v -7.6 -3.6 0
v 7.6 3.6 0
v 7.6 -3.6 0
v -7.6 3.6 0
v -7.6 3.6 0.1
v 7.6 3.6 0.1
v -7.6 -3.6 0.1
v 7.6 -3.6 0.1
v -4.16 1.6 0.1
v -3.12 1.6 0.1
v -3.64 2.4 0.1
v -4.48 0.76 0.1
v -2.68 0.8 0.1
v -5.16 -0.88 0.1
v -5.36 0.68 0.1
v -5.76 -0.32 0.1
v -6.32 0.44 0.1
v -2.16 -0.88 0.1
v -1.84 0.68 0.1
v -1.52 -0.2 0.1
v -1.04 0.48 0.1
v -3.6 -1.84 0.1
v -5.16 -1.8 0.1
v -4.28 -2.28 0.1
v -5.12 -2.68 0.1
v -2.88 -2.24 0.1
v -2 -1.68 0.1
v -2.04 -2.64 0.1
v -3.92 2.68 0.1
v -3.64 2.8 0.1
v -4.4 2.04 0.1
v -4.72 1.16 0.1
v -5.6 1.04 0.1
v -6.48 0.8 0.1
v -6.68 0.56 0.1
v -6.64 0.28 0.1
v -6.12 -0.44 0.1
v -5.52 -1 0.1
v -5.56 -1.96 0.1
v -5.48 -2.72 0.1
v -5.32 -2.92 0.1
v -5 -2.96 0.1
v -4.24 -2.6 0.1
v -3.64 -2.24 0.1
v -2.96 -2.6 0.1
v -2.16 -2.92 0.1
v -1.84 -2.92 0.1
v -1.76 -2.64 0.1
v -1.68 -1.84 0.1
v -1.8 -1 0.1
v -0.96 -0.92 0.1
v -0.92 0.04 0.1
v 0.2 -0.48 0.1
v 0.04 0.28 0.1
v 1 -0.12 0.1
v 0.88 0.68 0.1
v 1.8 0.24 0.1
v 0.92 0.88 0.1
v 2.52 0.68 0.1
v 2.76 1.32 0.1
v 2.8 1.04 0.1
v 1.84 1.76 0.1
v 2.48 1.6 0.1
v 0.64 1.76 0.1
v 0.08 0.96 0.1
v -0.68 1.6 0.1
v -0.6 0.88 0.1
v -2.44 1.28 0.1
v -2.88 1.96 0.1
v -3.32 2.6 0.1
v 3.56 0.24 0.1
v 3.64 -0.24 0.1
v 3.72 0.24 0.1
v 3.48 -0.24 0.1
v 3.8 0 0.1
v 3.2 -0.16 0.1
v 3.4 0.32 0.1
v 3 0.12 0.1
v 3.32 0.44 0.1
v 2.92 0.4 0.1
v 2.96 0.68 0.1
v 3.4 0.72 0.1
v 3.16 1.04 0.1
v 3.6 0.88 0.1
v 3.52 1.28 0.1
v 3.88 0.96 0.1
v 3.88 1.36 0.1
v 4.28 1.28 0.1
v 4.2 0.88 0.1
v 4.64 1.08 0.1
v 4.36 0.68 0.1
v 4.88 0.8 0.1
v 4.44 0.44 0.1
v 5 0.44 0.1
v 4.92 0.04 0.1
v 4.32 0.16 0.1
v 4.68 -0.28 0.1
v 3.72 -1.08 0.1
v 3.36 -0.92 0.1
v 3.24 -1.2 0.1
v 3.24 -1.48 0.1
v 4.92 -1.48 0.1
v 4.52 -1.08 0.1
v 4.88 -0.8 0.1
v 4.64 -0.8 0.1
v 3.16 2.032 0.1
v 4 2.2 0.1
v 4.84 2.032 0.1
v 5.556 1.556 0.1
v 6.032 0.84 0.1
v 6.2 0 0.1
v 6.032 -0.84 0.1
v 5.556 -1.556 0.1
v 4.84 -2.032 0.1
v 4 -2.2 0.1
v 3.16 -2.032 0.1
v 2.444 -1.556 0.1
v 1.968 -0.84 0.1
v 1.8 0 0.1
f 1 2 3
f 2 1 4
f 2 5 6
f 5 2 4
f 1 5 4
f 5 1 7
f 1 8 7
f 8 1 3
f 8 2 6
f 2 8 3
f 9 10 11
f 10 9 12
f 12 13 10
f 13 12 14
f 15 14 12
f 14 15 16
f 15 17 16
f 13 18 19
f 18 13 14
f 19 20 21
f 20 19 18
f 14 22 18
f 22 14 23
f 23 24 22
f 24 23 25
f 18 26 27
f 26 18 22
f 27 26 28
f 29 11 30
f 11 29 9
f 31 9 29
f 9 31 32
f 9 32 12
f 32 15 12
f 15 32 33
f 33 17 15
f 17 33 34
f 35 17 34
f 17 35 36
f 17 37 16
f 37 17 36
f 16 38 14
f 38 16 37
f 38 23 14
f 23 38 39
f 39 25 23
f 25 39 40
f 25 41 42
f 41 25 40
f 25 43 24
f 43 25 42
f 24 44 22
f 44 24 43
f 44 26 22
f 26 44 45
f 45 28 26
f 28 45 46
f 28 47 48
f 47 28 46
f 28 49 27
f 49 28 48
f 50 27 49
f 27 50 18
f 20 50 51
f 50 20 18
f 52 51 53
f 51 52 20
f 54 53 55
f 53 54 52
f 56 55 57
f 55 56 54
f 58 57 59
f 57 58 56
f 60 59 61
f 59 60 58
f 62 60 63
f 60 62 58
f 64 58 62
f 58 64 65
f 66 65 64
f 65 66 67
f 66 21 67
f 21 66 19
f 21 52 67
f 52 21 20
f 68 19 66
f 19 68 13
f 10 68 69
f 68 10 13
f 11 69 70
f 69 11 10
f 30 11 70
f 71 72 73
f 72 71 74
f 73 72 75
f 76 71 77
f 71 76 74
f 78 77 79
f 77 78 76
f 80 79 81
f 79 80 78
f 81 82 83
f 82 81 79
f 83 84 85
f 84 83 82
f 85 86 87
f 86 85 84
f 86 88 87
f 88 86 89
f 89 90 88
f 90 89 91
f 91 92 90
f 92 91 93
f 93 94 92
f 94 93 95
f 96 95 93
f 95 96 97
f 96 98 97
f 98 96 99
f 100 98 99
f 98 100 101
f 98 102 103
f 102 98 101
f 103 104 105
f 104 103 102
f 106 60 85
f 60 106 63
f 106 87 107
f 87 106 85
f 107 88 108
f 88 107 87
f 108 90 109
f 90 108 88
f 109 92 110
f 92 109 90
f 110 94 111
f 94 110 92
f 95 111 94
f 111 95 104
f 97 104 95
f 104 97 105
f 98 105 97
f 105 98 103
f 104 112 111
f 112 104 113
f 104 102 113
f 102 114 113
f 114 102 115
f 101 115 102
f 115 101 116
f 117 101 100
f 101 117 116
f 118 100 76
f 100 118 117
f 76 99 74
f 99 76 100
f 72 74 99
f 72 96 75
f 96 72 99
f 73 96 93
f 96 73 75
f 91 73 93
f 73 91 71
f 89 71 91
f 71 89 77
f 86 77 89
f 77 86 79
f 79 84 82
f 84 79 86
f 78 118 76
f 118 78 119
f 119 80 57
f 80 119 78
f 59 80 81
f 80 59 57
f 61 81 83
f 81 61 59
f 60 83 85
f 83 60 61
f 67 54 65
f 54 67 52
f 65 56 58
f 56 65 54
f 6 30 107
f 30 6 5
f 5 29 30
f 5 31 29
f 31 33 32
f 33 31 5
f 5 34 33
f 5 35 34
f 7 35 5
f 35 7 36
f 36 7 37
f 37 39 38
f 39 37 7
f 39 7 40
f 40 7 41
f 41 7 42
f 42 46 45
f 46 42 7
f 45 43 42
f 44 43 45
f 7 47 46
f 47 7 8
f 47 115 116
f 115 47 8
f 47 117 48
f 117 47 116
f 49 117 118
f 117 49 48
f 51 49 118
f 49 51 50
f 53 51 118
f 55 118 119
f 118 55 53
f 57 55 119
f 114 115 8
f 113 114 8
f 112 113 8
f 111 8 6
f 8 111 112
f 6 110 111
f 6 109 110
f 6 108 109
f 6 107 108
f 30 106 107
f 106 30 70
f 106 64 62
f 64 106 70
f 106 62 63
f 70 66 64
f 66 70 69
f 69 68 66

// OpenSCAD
// file: ../p/box5-12.scad
use <../lib.scad>
function ldraw_lib__box5_12() = [
// 0 Box with 5 Faces without Any Edges
// 0 Name: box5-12.dat
// 0 Author: Chris Dee [cwdee]
// 0 !LDRAW_ORG Primitive UPDATE 2009-02
// 0 !LICENSE Licensed under CC BY 4.0 : see CAreadme.txt
// 
// 0 BFC CERTIFY CCW
  [0,"BFC","CERTIFY"],
  [0,"BFC","CCW"],
// 
// 0 !HISTORY 2009-09-03 [PTadmin] Official Update 2009-02
// 
// 
// 4 16 1 1 1 1 1 -1 -1 1 -1 -1 1 1
  [4,16,1,1,1,1,1,-1,-1,1,-1,-1,1,1],
// 4 16 -1 0 1 1 0 1 1 1 1 -1 1 1
  [4,16,-1,0,1,1,0,1,1,1,1,-1,1,1],
// 4 16 -1 0 -1 -1 0 1 -1 1 1 -1 1 -1
  [4,16,-1,0,-1,-1,0,1,-1,1,1,-1,1,-1],
// 4 16 1 0 -1 -1 0 -1 -1 1 -1 1 1 -1
  [4,16,1,0,-1,-1,0,-1,-1,1,-1,1,1,-1],
// 4 16 1 0 1 1 0 -1 1 1 -1 1 1 1
  [4,16,1,0,1,1,0,-1,1,1,-1,1,1,1],
// 0
];
module ldraw_lib__box5_12(step=0, col=false, unit=2/5, alt=false, line=0.2, solid=!$preview)
    makepoly(ldraw_lib__box5_12(), step=step, col=col, unit=unit, alt=alt, line=line, solid=solid);
ldraw_lib__box5_12(line=0.2);
// main file
use <../lib.scad>
use <../p/box5-12.scad>
function ldraw_lib__6018377d() = [
// 0 Sticker  0.9 x  1.9 with Star and Medium Lavender "2" in White Circle on Lime Background
// 0 Name: 6018377d.dat
// 0 Author: Takeshi Takahashi [RainbowDolphin]
// 0 !LDRAW_ORG Part UPDATE 2025-07
// 0 !LICENSE Licensed under CC BY 4.0 : see CAreadme.txt
// 
// 0 BFC CERTIFY CCW
  [0,"BFC","CERTIFY"],
  [0,"BFC","CCW"],
// 
// 0 !KEYWORDS Pet salon, Price card, Set 41007
// 
// 0 !HISTORY 2025-07-27 [OrionP] Official Update 2025-07
// 
// 
// 1 16 0 -0.25 0 19 0 0 0 0.25 0 0 0 9 box5-12.dat
  [1,16,0,-0.25,0,19,0,0,0,0.25,0,0,0,9, ldraw_lib__box5_12()],
// 4 26 -7.8 -0.25 4 -9.1 -0.25 6 -10.4 -0.25 4 -11.2 -0.25 1.9
  [4,26,-7.8,-0.25,4,-9.1,-0.25,6,-10.4,-0.25,4,-11.2,-0.25,1.9],
// 4 26 -6.7 -0.25 2 -7.8 -0.25 4 -11.2 -0.25 1.9 -12.9 -0.25 -2.2
  [4,26,-6.7,-0.25,2,-7.8,-0.25,4,-11.2,-0.25,1.9,-12.9,-0.25,-2.2],
// 4 26 -12.9 -0.25 -2.2 -11.2 -0.25 1.9 -13.4 -0.25 1.7 -14.4 -0.25 -0.8
  [4,26,-12.9,-0.25,-2.2,-11.2,-0.25,1.9,-13.4,-0.25,1.7,-14.4,-0.25,-0.8],
// 3 26 -13.4 -0.25 1.7 -15.8 -0.25 1.1 -14.4 -0.25 -0.8
  [3,26,-13.4,-0.25,1.7,-15.8,-0.25,1.1,-14.4,-0.25,-0.8],
// 4 26 -6.7 -0.25 2 -12.9 -0.25 -2.2 -5.4 -0.25 -2.2 -4.6 -0.25 1.7
  [4,26,-6.7,-0.25,2,-12.9,-0.25,-2.2,-5.4,-0.25,-2.2,-4.6,-0.25,1.7],
// 4 26 -4.6 -0.25 1.7 -5.4 -0.25 -2.2 -3.8 -0.25 -0.5 -2.6 -0.25 1.2
  [4,26,-4.6,-0.25,1.7,-5.4,-0.25,-2.2,-3.8,-0.25,-0.5,-2.6,-0.25,1.2],
// 4 26 -9 -0.25 -4.6 -5.4 -0.25 -2.2 -12.9 -0.25 -2.2 -12.9 -0.25 -4.5
  [4,26,-9,-0.25,-4.6,-5.4,-0.25,-2.2,-12.9,-0.25,-2.2,-12.9,-0.25,-4.5],
// 4 26 -10.7 -0.25 -5.7 -9 -0.25 -4.6 -12.9 -0.25 -4.5 -12.8 -0.25 -6.7
  [4,26,-10.7,-0.25,-5.7,-9,-0.25,-4.6,-12.9,-0.25,-4.5,-12.8,-0.25,-6.7],
// 4 26 -5.4 -0.25 -2.2 -9 -0.25 -4.6 -7.2 -0.25 -5.6 -5 -0.25 -4.2
  [4,26,-5.4,-0.25,-2.2,-9,-0.25,-4.6,-7.2,-0.25,-5.6,-5,-0.25,-4.2],
// 3 26 -5 -0.25 -4.2 -7.2 -0.25 -5.6 -5.1 -0.25 -6.6
  [3,26,-5,-0.25,-4.2,-7.2,-0.25,-5.6,-5.1,-0.25,-6.6],
// 4 80 -9.1 -0.25 6 -9.1 -0.25 7 -9.8 -0.25 6.7 -10.4 -0.25 4
  [4,80,-9.1,-0.25,6,-9.1,-0.25,7,-9.8,-0.25,6.7,-10.4,-0.25,4],
// 4 80 -10.4 -0.25 4 -9.8 -0.25 6.7 -11 -0.25 5.1 -11.8 -0.25 2.9
  [4,80,-10.4,-0.25,4,-9.8,-0.25,6.7,-11,-0.25,5.1,-11.8,-0.25,2.9],
// 3 80 -10.4 -0.25 4 -11.8 -0.25 2.9 -11.2 -0.25 1.9
  [3,80,-10.4,-0.25,4,-11.8,-0.25,2.9,-11.2,-0.25,1.9],
// 4 80 -13.4 -0.25 1.7 -11.2 -0.25 1.9 -11.8 -0.25 2.9 -14 -0.25 2.6
  [4,80,-13.4,-0.25,1.7,-11.2,-0.25,1.9,-11.8,-0.25,2.9,-14,-0.25,2.6],
// 4 80 -15.8 -0.25 1.1 -13.4 -0.25 1.7 -14 -0.25 2.6 -16.2 -0.25 2
  [4,80,-15.8,-0.25,1.1,-13.4,-0.25,1.7,-14,-0.25,2.6,-16.2,-0.25,2],
// 4 80 -15.8 -0.25 1.1 -16.2 -0.25 2 -16.7 -0.25 1.4 -16.6 -0.25 0.7
  [4,80,-15.8,-0.25,1.1,-16.2,-0.25,2,-16.7,-0.25,1.4,-16.6,-0.25,0.7],
// 4 80 -14.4 -0.25 -0.8 -15.8 -0.25 1.1 -16.6 -0.25 0.7 -15.3 -0.25 -1.1
  [4,80,-14.4,-0.25,-0.8,-15.8,-0.25,1.1,-16.6,-0.25,0.7,-15.3,-0.25,-1.1],
// 4 80 -14.4 -0.25 -0.8 -15.3 -0.25 -1.1 -13.8 -0.25 -2.5 -12.9 -0.25 -2.2
  [4,80,-14.4,-0.25,-0.8,-15.3,-0.25,-1.1,-13.8,-0.25,-2.5,-12.9,-0.25,-2.2],
// 4 80 -12.9 -0.25 -4.5 -12.9 -0.25 -2.2 -13.8 -0.25 -2.5 -13.9 -0.25 -4.9
  [4,80,-12.9,-0.25,-4.5,-12.9,-0.25,-2.2,-13.8,-0.25,-2.5,-13.9,-0.25,-4.9],
// 4 80 -12.8 -0.25 -6.7 -12.9 -0.25 -4.5 -13.9 -0.25 -4.9 -13.7 -0.25 -6.8
  [4,80,-12.8,-0.25,-6.7,-12.9,-0.25,-4.5,-13.9,-0.25,-4.9,-13.7,-0.25,-6.8],
// 4 80 -12.8 -0.25 -6.7 -13.7 -0.25 -6.8 -13.3 -0.25 -7.3 -12.5 -0.25 -7.4
  [4,80,-12.8,-0.25,-6.7,-13.7,-0.25,-6.8,-13.3,-0.25,-7.3,-12.5,-0.25,-7.4],
// 4 80 -10.7 -0.25 -5.7 -12.8 -0.25 -6.7 -12.5 -0.25 -7.4 -10.6 -0.25 -6.5
  [4,80,-10.7,-0.25,-5.7,-12.8,-0.25,-6.7,-12.5,-0.25,-7.4,-10.6,-0.25,-6.5],
// 4 80 -10.7 -0.25 -5.7 -10.6 -0.25 -6.5 -9.1 -0.25 -5.6 -9 -0.25 -4.6
  [4,80,-10.7,-0.25,-5.7,-10.6,-0.25,-6.5,-9.1,-0.25,-5.6,-9,-0.25,-4.6],
// 4 80 -7.2 -0.25 -5.6 -9 -0.25 -4.6 -9.1 -0.25 -5.6 -7.4 -0.25 -6.5
  [4,80,-7.2,-0.25,-5.6,-9,-0.25,-4.6,-9.1,-0.25,-5.6,-7.4,-0.25,-6.5],
// 4 80 -5.1 -0.25 -6.6 -7.2 -0.25 -5.6 -7.4 -0.25 -6.5 -5.4 -0.25 -7.3
  [4,80,-5.1,-0.25,-6.6,-7.2,-0.25,-5.6,-7.4,-0.25,-6.5,-5.4,-0.25,-7.3],
// 4 80 -5.1 -0.25 -6.6 -5.4 -0.25 -7.3 -4.6 -0.25 -7.3 -4.4 -0.25 -6.6
  [4,80,-5.1,-0.25,-6.6,-5.4,-0.25,-7.3,-4.6,-0.25,-7.3,-4.4,-0.25,-6.6],
// 4 80 -5 -0.25 -4.2 -5.1 -0.25 -6.6 -4.4 -0.25 -6.6 -4.2 -0.25 -4.6
  [4,80,-5,-0.25,-4.2,-5.1,-0.25,-6.6,-4.4,-0.25,-6.6,-4.2,-0.25,-4.6],
// 4 80 -5 -0.25 -4.2 -4.2 -0.25 -4.6 -4.5 -0.25 -2.5 -5.4 -0.25 -2.2
  [4,80,-5,-0.25,-4.2,-4.2,-0.25,-4.6,-4.5,-0.25,-2.5,-5.4,-0.25,-2.2],
// 4 80 -3.8 -0.25 -0.5 -5.4 -0.25 -2.2 -4.5 -0.25 -2.5 -2.4 -0.25 -2.3
  [4,80,-3.8,-0.25,-0.5,-5.4,-0.25,-2.2,-4.5,-0.25,-2.5,-2.4,-0.25,-2.3],
// 4 80 -2.3 -0.25 0.1 -3.8 -0.25 -0.5 -2.4 -0.25 -2.3 0.5 -0.25 -1.2
  [4,80,-2.3,-0.25,0.1,-3.8,-0.25,-0.5,-2.4,-0.25,-2.3,0.5,-0.25,-1.2],
// 4 80 0.1 -0.25 0.7 -2.3 -0.25 0.1 0.5 -0.25 -1.2 2.5 -0.25 -0.3
  [4,80,0.1,-0.25,0.7,-2.3,-0.25,0.1,0.5,-0.25,-1.2,2.5,-0.25,-0.3],
// 4 80 2.2 -0.25 1.7 0.1 -0.25 0.7 2.5 -0.25 -0.3 4.5 -0.25 0.6
  [4,80,2.2,-0.25,1.7,0.1,-0.25,0.7,2.5,-0.25,-0.3,4.5,-0.25,0.6],
// 4 80 2.3 -0.25 2.2 2.2 -0.25 1.7 4.5 -0.25 0.6 6.3 -0.25 1.7
  [4,80,2.3,-0.25,2.2,2.2,-0.25,1.7,4.5,-0.25,0.6,6.3,-0.25,1.7],
// 4 80 2.3 -0.25 2.2 6.3 -0.25 1.7 7 -0.25 2.6 6.9 -0.25 3.3
  [4,80,2.3,-0.25,2.2,6.3,-0.25,1.7,7,-0.25,2.6,6.9,-0.25,3.3],
// 4 80 2.3 -0.25 2.2 6.9 -0.25 3.3 6.2 -0.25 4 4.6 -0.25 4.4
  [4,80,2.3,-0.25,2.2,6.9,-0.25,3.3,6.2,-0.25,4,4.6,-0.25,4.4],
// 4 80 2.3 -0.25 2.2 4.6 -0.25 4.4 1.6 -0.25 4.4 0.2 -0.25 2.4
  [4,80,2.3,-0.25,2.2,4.6,-0.25,4.4,1.6,-0.25,4.4,0.2,-0.25,2.4],
// 4 80 0.2 -0.25 2.4 1.6 -0.25 4.4 -1.7 -0.25 4 -1.5 -0.25 2.2
  [4,80,0.2,-0.25,2.4,1.6,-0.25,4.4,-1.7,-0.25,4,-1.5,-0.25,2.2],
// 4 80 -1.5 -0.25 2.2 -1.7 -0.25 4 -4.6 -0.25 1.7 -2.6 -0.25 1.2
  [4,80,-1.5,-0.25,2.2,-1.7,-0.25,4,-4.6,-0.25,1.7,-2.6,-0.25,1.2],
// 4 80 -2.3 -0.25 0.1 -1.5 -0.25 2.2 -2.6 -0.25 1.2 -3.8 -0.25 -0.5
  [4,80,-2.3,-0.25,0.1,-1.5,-0.25,2.2,-2.6,-0.25,1.2,-3.8,-0.25,-0.5],
// 4 80 -4.6 -0.25 1.7 -1.7 -0.25 4 -6.1 -0.25 3.2 -6.7 -0.25 2
  [4,80,-4.6,-0.25,1.7,-1.7,-0.25,4,-6.1,-0.25,3.2,-6.7,-0.25,2],
// 4 80 -7.8 -0.25 4 -6.7 -0.25 2 -6.1 -0.25 3.2 -7.2 -0.25 4.9
  [4,80,-7.8,-0.25,4,-6.7,-0.25,2,-6.1,-0.25,3.2,-7.2,-0.25,4.9],
// 4 80 -9.1 -0.25 6 -7.8 -0.25 4 -7.2 -0.25 4.9 -8.3 -0.25 6.5
  [4,80,-9.1,-0.25,6,-7.8,-0.25,4,-7.2,-0.25,4.9,-8.3,-0.25,6.5],
// 3 80 -9.1 -0.25 7 -9.1 -0.25 6 -8.3 -0.25 6.5
  [3,80,-9.1,-0.25,7,-9.1,-0.25,6,-8.3,-0.25,6.5],
// 4 30 8.9 -0.25 0.6 8.7 -0.25 -0.6 9.1 -0.25 -0.6 9.3 -0.25 0.6
  [4,30,8.9,-0.25,0.6,8.7,-0.25,-0.6,9.1,-0.25,-0.6,9.3,-0.25,0.6],
// 3 30 9.3 -0.25 0.6 9.1 -0.25 -0.6 9.5 -0.25 0
  [3,30,9.3,-0.25,0.6,9.1,-0.25,-0.6,9.5,-0.25,0],
// 4 30 8 -0.25 -0.4 8.7 -0.25 -0.6 8.9 -0.25 0.6 8.5 -0.25 0.8
  [4,30,8,-0.25,-0.4,8.7,-0.25,-0.6,8.9,-0.25,0.6,8.5,-0.25,0.8],
// 4 30 7.5 -0.25 0.3 8 -0.25 -0.4 8.5 -0.25 0.8 8.3 -0.25 1.1
  [4,30,7.5,-0.25,0.3,8,-0.25,-0.4,8.5,-0.25,0.8,8.3,-0.25,1.1],
// 4 30 7.3 -0.25 1 7.5 -0.25 0.3 8.3 -0.25 1.1 7.4 -0.25 1.7
  [4,30,7.3,-0.25,1,7.5,-0.25,0.3,8.3,-0.25,1.1,7.4,-0.25,1.7],
// 4 30 7.4 -0.25 1.7 8.3 -0.25 1.1 8.5 -0.25 1.8 7.9 -0.25 2.6
  [4,30,7.4,-0.25,1.7,8.3,-0.25,1.1,8.5,-0.25,1.8,7.9,-0.25,2.6],
// 4 30 7.9 -0.25 2.6 8.5 -0.25 1.8 9 -0.25 2.2 8.8 -0.25 3.2
  [4,30,7.9,-0.25,2.6,8.5,-0.25,1.8,9,-0.25,2.2,8.8,-0.25,3.2],
// 4 30 8.8 -0.25 3.2 9 -0.25 2.2 9.7 -0.25 2.4 9.7 -0.25 3.4
  [4,30,8.8,-0.25,3.2,9,-0.25,2.2,9.7,-0.25,2.4,9.7,-0.25,3.4],
// 4 30 10.7 -0.25 3.2 9.7 -0.25 3.4 9.7 -0.25 2.4 10.5 -0.25 2.2
  [4,30,10.7,-0.25,3.2,9.7,-0.25,3.4,9.7,-0.25,2.4,10.5,-0.25,2.2],
// 4 30 11.6 -0.25 2.7 10.7 -0.25 3.2 10.5 -0.25 2.2 10.9 -0.25 1.7
  [4,30,11.6,-0.25,2.7,10.7,-0.25,3.2,10.5,-0.25,2.2,10.9,-0.25,1.7],
// 4 30 12.2 -0.25 2 11.6 -0.25 2.7 10.9 -0.25 1.7 11.1 -0.25 1.1
  [4,30,12.2,-0.25,2,11.6,-0.25,2.7,10.9,-0.25,1.7,11.1,-0.25,1.1],
// 4 30 12.5 -0.25 1.1 12.2 -0.25 2 11.1 -0.25 1.1 12.3 -0.25 0.1
  [4,30,12.5,-0.25,1.1,12.2,-0.25,2,11.1,-0.25,1.1,12.3,-0.25,0.1],
// 4 30 12.3 -0.25 0.1 11.1 -0.25 1.1 10.8 -0.25 0.4 11.7 -0.25 -0.7
  [4,30,12.3,-0.25,0.1,11.1,-0.25,1.1,10.8,-0.25,0.4,11.7,-0.25,-0.7],
// 4 30 9.3 -0.25 -2.7 11.7 -0.25 -0.7 10.8 -0.25 0.4 8.4 -0.25 -2.3
  [4,30,9.3,-0.25,-2.7,11.7,-0.25,-0.7,10.8,-0.25,0.4,8.4,-0.25,-2.3],
// 4 30 9.3 -0.25 -2.7 8.4 -0.25 -2.3 8.1 -0.25 -3 8.1 -0.25 -3.7
  [4,30,9.3,-0.25,-2.7,8.4,-0.25,-2.3,8.1,-0.25,-3,8.1,-0.25,-3.7],
// 4 30 9.3 -0.25 -2.7 8.1 -0.25 -3.7 12.3 -0.25 -3.7 11.3 -0.25 -2.7
  [4,30,9.3,-0.25,-2.7,8.1,-0.25,-3.7,12.3,-0.25,-3.7,11.3,-0.25,-2.7],
// 4 30 11.3 -0.25 -2.7 12.3 -0.25 -3.7 12.2 -0.25 -2 11.6 -0.25 -2
  [4,30,11.3,-0.25,-2.7,12.3,-0.25,-3.7,12.2,-0.25,-2,11.6,-0.25,-2],
// 4 15 7.9 -0.25 5.08 6.2 -0.25 4 6.9 -0.25 3.3 8.8 -0.25 3.2
  [4,15,7.9,-0.25,5.08,6.2,-0.25,4,6.9,-0.25,3.3,8.8,-0.25,3.2],
// 4 15 10 -0.25 5.5 7.9 -0.25 5.08 8.8 -0.25 3.2 9.7 -0.25 3.4
  [4,15,10,-0.25,5.5,7.9,-0.25,5.08,8.8,-0.25,3.2,9.7,-0.25,3.4],
// 4 15 10 -0.25 5.5 9.7 -0.25 3.4 10.7 -0.25 3.2 12.1 -0.25 5.08
  [4,15,10,-0.25,5.5,9.7,-0.25,3.4,10.7,-0.25,3.2,12.1,-0.25,5.08],
// 4 15 12.1 -0.25 5.08 10.7 -0.25 3.2 11.6 -0.25 2.7 13.89 -0.25 3.89
  [4,15,12.1,-0.25,5.08,10.7,-0.25,3.2,11.6,-0.25,2.7,13.89,-0.25,3.89],
// 4 15 13.89 -0.25 3.89 11.6 -0.25 2.7 12.2 -0.25 2 15.08 -0.25 2.1
  [4,15,13.89,-0.25,3.89,11.6,-0.25,2.7,12.2,-0.25,2,15.08,-0.25,2.1],
// 4 15 15.08 -0.25 2.1 12.2 -0.25 2 12.5 -0.25 1.1 15.5 -0.25 0
  [4,15,15.08,-0.25,2.1,12.2,-0.25,2,12.5,-0.25,1.1,15.5,-0.25,0],
// 4 15 15.5 -0.25 0 12.5 -0.25 1.1 12.3 -0.25 0.1 12.2 -0.25 -2
  [4,15,15.5,-0.25,0,12.5,-0.25,1.1,12.3,-0.25,0.1,12.2,-0.25,-2],
// 4 15 12.2 -0.25 -2 12.3 -0.25 0.1 11.7 -0.25 -0.7 11.6 -0.25 -2
  [4,15,12.2,-0.25,-2,12.3,-0.25,0.1,11.7,-0.25,-0.7,11.6,-0.25,-2],
// 4 15 11.6 -0.25 -2 11.7 -0.25 -0.7 9.3 -0.25 -2.7 11.3 -0.25 -2.7
  [4,15,11.6,-0.25,-2,11.7,-0.25,-0.7,9.3,-0.25,-2.7,11.3,-0.25,-2.7],
// 4 15 15.08 -0.25 -2.1 15.5 -0.25 0 12.2 -0.25 -2 13.89 -0.25 -3.89
  [4,15,15.08,-0.25,-2.1,15.5,-0.25,0,12.2,-0.25,-2,13.89,-0.25,-3.89],
// 3 15 12.2 -0.25 -2 12.3 -0.25 -3.7 13.89 -0.25 -3.89
  [3,15,12.2,-0.25,-2,12.3,-0.25,-3.7,13.89,-0.25,-3.89],
// 4 15 12.1 -0.25 -5.08 13.89 -0.25 -3.89 12.3 -0.25 -3.7 10 -0.25 -5.5
  [4,15,12.1,-0.25,-5.08,13.89,-0.25,-3.89,12.3,-0.25,-3.7,10,-0.25,-5.5],
// 4 15 10 -0.25 -5.5 12.3 -0.25 -3.7 8.1 -0.25 -3.7 7.9 -0.25 -5.08
  [4,15,10,-0.25,-5.5,12.3,-0.25,-3.7,8.1,-0.25,-3.7,7.9,-0.25,-5.08],
// 4 15 6.11 -0.25 -3.89 7.9 -0.25 -5.08 8.1 -0.25 -3.7 8.1 -0.25 -3
  [4,15,6.11,-0.25,-3.89,7.9,-0.25,-5.08,8.1,-0.25,-3.7,8.1,-0.25,-3],
// 4 15 4.92 -0.25 -2.1 6.11 -0.25 -3.89 8.1 -0.25 -3 8 -0.25 -0.4
  [4,15,4.92,-0.25,-2.1,6.11,-0.25,-3.89,8.1,-0.25,-3,8,-0.25,-0.4],
// 4 15 8 -0.25 -0.4 8.1 -0.25 -3 8.4 -0.25 -2.3 8.7 -0.25 -0.6
  [4,15,8,-0.25,-0.4,8.1,-0.25,-3,8.4,-0.25,-2.3,8.7,-0.25,-0.6],
// 3 15 9.1 -0.25 -0.6 8.7 -0.25 -0.6 8.4 -0.25 -2.3
  [3,15,9.1,-0.25,-0.6,8.7,-0.25,-0.6,8.4,-0.25,-2.3],
// 4 15 9.1 -0.25 -0.6 8.4 -0.25 -2.3 10.8 -0.25 0.4 9.5 -0.25 0
  [4,15,9.1,-0.25,-0.6,8.4,-0.25,-2.3,10.8,-0.25,0.4,9.5,-0.25,0],
// 4 15 9.5 -0.25 0 10.8 -0.25 0.4 11.1 -0.25 1.1 9.3 -0.25 0.6
  [4,15,9.5,-0.25,0,10.8,-0.25,0.4,11.1,-0.25,1.1,9.3,-0.25,0.6],
// 4 15 9.3 -0.25 0.6 11.1 -0.25 1.1 10.9 -0.25 1.7 8.9 -0.25 0.6
  [4,15,9.3,-0.25,0.6,11.1,-0.25,1.1,10.9,-0.25,1.7,8.9,-0.25,0.6],
// 4 15 8.9 -0.25 0.6 10.9 -0.25 1.7 10.5 -0.25 2.2 8.5 -0.25 0.8
  [4,15,8.9,-0.25,0.6,10.9,-0.25,1.7,10.5,-0.25,2.2,8.5,-0.25,0.8],
// 4 15 8.5 -0.25 0.8 10.5 -0.25 2.2 9.7 -0.25 2.4 8.3 -0.25 1.1
  [4,15,8.5,-0.25,0.8,10.5,-0.25,2.2,9.7,-0.25,2.4,8.3,-0.25,1.1],
// 4 15 8.3 -0.25 1.1 9.7 -0.25 2.4 9 -0.25 2.2 8.5 -0.25 1.8
  [4,15,8.3,-0.25,1.1,9.7,-0.25,2.4,9,-0.25,2.2,8.5,-0.25,1.8],
// 4 15 4.5 -0.25 0 4.92 -0.25 -2.1 8 -0.25 -0.4 7.5 -0.25 0.3
  [4,15,4.5,-0.25,0,4.92,-0.25,-2.1,8,-0.25,-0.4,7.5,-0.25,0.3],
// 4 15 4.5 -0.25 0.6 4.5 -0.25 0 7.5 -0.25 0.3 7.3 -0.25 1
  [4,15,4.5,-0.25,0.6,4.5,-0.25,0,7.5,-0.25,0.3,7.3,-0.25,1],
// 4 15 6.3 -0.25 1.7 4.5 -0.25 0.6 7.3 -0.25 1 7.4 -0.25 1.7
  [4,15,6.3,-0.25,1.7,4.5,-0.25,0.6,7.3,-0.25,1,7.4,-0.25,1.7],
// 4 15 7 -0.25 2.6 6.3 -0.25 1.7 7.4 -0.25 1.7 7.9 -0.25 2.6
  [4,15,7,-0.25,2.6,6.3,-0.25,1.7,7.4,-0.25,1.7,7.9,-0.25,2.6],
// 4 15 6.9 -0.25 3.3 7 -0.25 2.6 7.9 -0.25 2.6 8.8 -0.25 3.2
  [4,15,6.9,-0.25,3.3,7,-0.25,2.6,7.9,-0.25,2.6,8.8,-0.25,3.2],
// 4 27 -1.5 -0.25 2.2 -2.3 -0.25 0.1 0.1 -0.25 0.7 0.2 -0.25 2.4
  [4,27,-1.5,-0.25,2.2,-2.3,-0.25,0.1,0.1,-0.25,0.7,0.2,-0.25,2.4],
// 4 27 0.2 -0.25 2.4 0.1 -0.25 0.7 2.2 -0.25 1.7 2.3 -0.25 2.2
  [4,27,0.2,-0.25,2.4,0.1,-0.25,0.7,2.2,-0.25,1.7,2.3,-0.25,2.2],
// 4 27 19 -0.25 9 -19 -0.25 9 -9.1 -0.25 7 10 -0.25 5.5
  [4,27,19,-0.25,9,-19,-0.25,9,-9.1,-0.25,7,10,-0.25,5.5],
// 3 27 -19 -0.25 9 -9.8 -0.25 6.7 -9.1 -0.25 7
  [3,27,-19,-0.25,9,-9.8,-0.25,6.7,-9.1,-0.25,7],
// 3 27 -19 -0.25 9 -11 -0.25 5.1 -9.8 -0.25 6.7
  [3,27,-19,-0.25,9,-11,-0.25,5.1,-9.8,-0.25,6.7],
// 4 27 -11.8 -0.25 2.9 -11 -0.25 5.1 -19 -0.25 9 -14 -0.25 2.6
  [4,27,-11.8,-0.25,2.9,-11,-0.25,5.1,-19,-0.25,9,-14,-0.25,2.6],
// 3 27 -19 -0.25 9 -16.2 -0.25 2 -14 -0.25 2.6
  [3,27,-19,-0.25,9,-16.2,-0.25,2,-14,-0.25,2.6],
// 3 27 -19 -0.25 9 -16.7 -0.25 1.4 -16.2 -0.25 2
  [3,27,-19,-0.25,9,-16.7,-0.25,1.4,-16.2,-0.25,2],
// 4 27 -16.7 -0.25 1.4 -19 -0.25 9 -19 -0.25 -9 -16.6 -0.25 0.7
  [4,27,-16.7,-0.25,1.4,-19,-0.25,9,-19,-0.25,-9,-16.6,-0.25,0.7],
// 3 27 -16.6 -0.25 0.7 -19 -0.25 -9 -15.3 -0.25 -1.1
  [3,27,-16.6,-0.25,0.7,-19,-0.25,-9,-15.3,-0.25,-1.1],
// 4 27 -13.8 -0.25 -2.5 -15.3 -0.25 -1.1 -19 -0.25 -9 -13.9 -0.25 -4.9
  [4,27,-13.8,-0.25,-2.5,-15.3,-0.25,-1.1,-19,-0.25,-9,-13.9,-0.25,-4.9],
// 3 27 -13.9 -0.25 -4.9 -19 -0.25 -9 -13.7 -0.25 -6.8
  [3,27,-13.9,-0.25,-4.9,-19,-0.25,-9,-13.7,-0.25,-6.8],
// 3 27 -13.7 -0.25 -6.8 -19 -0.25 -9 -13.3 -0.25 -7.3
  [3,27,-13.7,-0.25,-6.8,-19,-0.25,-9,-13.3,-0.25,-7.3],
// 3 27 -13.3 -0.25 -7.3 -19 -0.25 -9 -12.5 -0.25 -7.4
  [3,27,-13.3,-0.25,-7.3,-19,-0.25,-9,-12.5,-0.25,-7.4],
// 4 27 -12.5 -0.25 -7.4 -19 -0.25 -9 -5.4 -0.25 -7.3 -7.4 -0.25 -6.5
  [4,27,-12.5,-0.25,-7.4,-19,-0.25,-9,-5.4,-0.25,-7.3,-7.4,-0.25,-6.5],
// 3 27 -7.4 -0.25 -6.5 -10.6 -0.25 -6.5 -12.5 -0.25 -7.4
  [3,27,-7.4,-0.25,-6.5,-10.6,-0.25,-6.5,-12.5,-0.25,-7.4],
// 3 27 -9.1 -0.25 -5.6 -10.6 -0.25 -6.5 -7.4 -0.25 -6.5
  [3,27,-9.1,-0.25,-5.6,-10.6,-0.25,-6.5,-7.4,-0.25,-6.5],
// 4 27 -4.6 -0.25 -7.3 -5.4 -0.25 -7.3 -19 -0.25 -9 19 -0.25 -9
  [4,27,-4.6,-0.25,-7.3,-5.4,-0.25,-7.3,-19,-0.25,-9,19,-0.25,-9],
// 4 27 -4.6 -0.25 -7.3 19 -0.25 -9 10 -0.25 -5.5 7.9 -0.25 -5.08
  [4,27,-4.6,-0.25,-7.3,19,-0.25,-9,10,-0.25,-5.5,7.9,-0.25,-5.08],
// 4 27 -4.4 -0.25 -6.6 -4.6 -0.25 -7.3 7.9 -0.25 -5.08 6.11 -0.25 -3.89
  [4,27,-4.4,-0.25,-6.6,-4.6,-0.25,-7.3,7.9,-0.25,-5.08,6.11,-0.25,-3.89],
// 4 27 -4.2 -0.25 -4.6 -4.4 -0.25 -6.6 6.11 -0.25 -3.89 4.92 -0.25 -2.1
  [4,27,-4.2,-0.25,-4.6,-4.4,-0.25,-6.6,6.11,-0.25,-3.89,4.92,-0.25,-2.1],
// 4 27 -4.2 -0.25 -4.6 4.92 -0.25 -2.1 -2.4 -0.25 -2.3 -4.5 -0.25 -2.5
  [4,27,-4.2,-0.25,-4.6,4.92,-0.25,-2.1,-2.4,-0.25,-2.3,-4.5,-0.25,-2.5],
// 3 27 0.5 -0.25 -1.2 -2.4 -0.25 -2.3 4.92 -0.25 -2.1
  [3,27,0.5,-0.25,-1.2,-2.4,-0.25,-2.3,4.92,-0.25,-2.1],
// 4 27 2.5 -0.25 -0.3 0.5 -0.25 -1.2 4.92 -0.25 -2.1 4.5 -0.25 0
  [4,27,2.5,-0.25,-0.3,0.5,-0.25,-1.2,4.92,-0.25,-2.1,4.5,-0.25,0],
// 3 27 4.5 -0.25 0.6 2.5 -0.25 -0.3 4.5 -0.25 0
  [3,27,4.5,-0.25,0.6,2.5,-0.25,-0.3,4.5,-0.25,0],
// 3 27 12.1 -0.25 -5.08 10 -0.25 -5.5 19 -0.25 -9
  [3,27,12.1,-0.25,-5.08,10,-0.25,-5.5,19,-0.25,-9],
// 3 27 13.89 -0.25 -3.89 12.1 -0.25 -5.08 19 -0.25 -9
  [3,27,13.89,-0.25,-3.89,12.1,-0.25,-5.08,19,-0.25,-9],
// 3 27 15.08 -0.25 -2.1 13.89 -0.25 -3.89 19 -0.25 -9
  [3,27,15.08,-0.25,-2.1,13.89,-0.25,-3.89,19,-0.25,-9],
// 4 27 15.5 -0.25 0 15.08 -0.25 -2.1 19 -0.25 -9 19 -0.25 9
  [4,27,15.5,-0.25,0,15.08,-0.25,-2.1,19,-0.25,-9,19,-0.25,9],
// 3 27 19 -0.25 9 15.08 -0.25 2.1 15.5 -0.25 0
  [3,27,19,-0.25,9,15.08,-0.25,2.1,15.5,-0.25,0],
// 3 27 19 -0.25 9 13.89 -0.25 3.89 15.08 -0.25 2.1
  [3,27,19,-0.25,9,13.89,-0.25,3.89,15.08,-0.25,2.1],
// 3 27 19 -0.25 9 12.1 -0.25 5.08 13.89 -0.25 3.89
  [3,27,19,-0.25,9,12.1,-0.25,5.08,13.89,-0.25,3.89],
// 3 27 19 -0.25 9 10 -0.25 5.5 12.1 -0.25 5.08
  [3,27,19,-0.25,9,10,-0.25,5.5,12.1,-0.25,5.08],
// 4 27 10 -0.25 5.5 -9.1 -0.25 7 -8.3 -0.25 6.5 7.9 -0.25 5.08
  [4,27,10,-0.25,5.5,-9.1,-0.25,7,-8.3,-0.25,6.5,7.9,-0.25,5.08],
// 4 27 4.6 -0.25 4.4 7.9 -0.25 5.08 -8.3 -0.25 6.5 1.6 -0.25 4.4
  [4,27,4.6,-0.25,4.4,7.9,-0.25,5.08,-8.3,-0.25,6.5,1.6,-0.25,4.4],
// 3 27 7.9 -0.25 5.08 4.6 -0.25 4.4 6.2 -0.25 4
  [3,27,7.9,-0.25,5.08,4.6,-0.25,4.4,6.2,-0.25,4],
// 4 27 1.6 -0.25 4.4 -8.3 -0.25 6.5 -7.2 -0.25 4.9 -1.7 -0.25 4
  [4,27,1.6,-0.25,4.4,-8.3,-0.25,6.5,-7.2,-0.25,4.9,-1.7,-0.25,4],
// 3 27 -7.2 -0.25 4.9 -6.1 -0.25 3.2 -1.7 -0.25 4
  [3,27,-7.2,-0.25,4.9,-6.1,-0.25,3.2,-1.7,-0.25,4],
];
module ldraw_lib__6018377d(step=0, col=false, unit=2/5, alt=false, line=0.2, solid=!$preview)
    makepoly(ldraw_lib__6018377d(), step=step, col=col, unit=unit, alt=alt, line=line, solid=solid);
ldraw_lib__6018377d(line=0.2);
